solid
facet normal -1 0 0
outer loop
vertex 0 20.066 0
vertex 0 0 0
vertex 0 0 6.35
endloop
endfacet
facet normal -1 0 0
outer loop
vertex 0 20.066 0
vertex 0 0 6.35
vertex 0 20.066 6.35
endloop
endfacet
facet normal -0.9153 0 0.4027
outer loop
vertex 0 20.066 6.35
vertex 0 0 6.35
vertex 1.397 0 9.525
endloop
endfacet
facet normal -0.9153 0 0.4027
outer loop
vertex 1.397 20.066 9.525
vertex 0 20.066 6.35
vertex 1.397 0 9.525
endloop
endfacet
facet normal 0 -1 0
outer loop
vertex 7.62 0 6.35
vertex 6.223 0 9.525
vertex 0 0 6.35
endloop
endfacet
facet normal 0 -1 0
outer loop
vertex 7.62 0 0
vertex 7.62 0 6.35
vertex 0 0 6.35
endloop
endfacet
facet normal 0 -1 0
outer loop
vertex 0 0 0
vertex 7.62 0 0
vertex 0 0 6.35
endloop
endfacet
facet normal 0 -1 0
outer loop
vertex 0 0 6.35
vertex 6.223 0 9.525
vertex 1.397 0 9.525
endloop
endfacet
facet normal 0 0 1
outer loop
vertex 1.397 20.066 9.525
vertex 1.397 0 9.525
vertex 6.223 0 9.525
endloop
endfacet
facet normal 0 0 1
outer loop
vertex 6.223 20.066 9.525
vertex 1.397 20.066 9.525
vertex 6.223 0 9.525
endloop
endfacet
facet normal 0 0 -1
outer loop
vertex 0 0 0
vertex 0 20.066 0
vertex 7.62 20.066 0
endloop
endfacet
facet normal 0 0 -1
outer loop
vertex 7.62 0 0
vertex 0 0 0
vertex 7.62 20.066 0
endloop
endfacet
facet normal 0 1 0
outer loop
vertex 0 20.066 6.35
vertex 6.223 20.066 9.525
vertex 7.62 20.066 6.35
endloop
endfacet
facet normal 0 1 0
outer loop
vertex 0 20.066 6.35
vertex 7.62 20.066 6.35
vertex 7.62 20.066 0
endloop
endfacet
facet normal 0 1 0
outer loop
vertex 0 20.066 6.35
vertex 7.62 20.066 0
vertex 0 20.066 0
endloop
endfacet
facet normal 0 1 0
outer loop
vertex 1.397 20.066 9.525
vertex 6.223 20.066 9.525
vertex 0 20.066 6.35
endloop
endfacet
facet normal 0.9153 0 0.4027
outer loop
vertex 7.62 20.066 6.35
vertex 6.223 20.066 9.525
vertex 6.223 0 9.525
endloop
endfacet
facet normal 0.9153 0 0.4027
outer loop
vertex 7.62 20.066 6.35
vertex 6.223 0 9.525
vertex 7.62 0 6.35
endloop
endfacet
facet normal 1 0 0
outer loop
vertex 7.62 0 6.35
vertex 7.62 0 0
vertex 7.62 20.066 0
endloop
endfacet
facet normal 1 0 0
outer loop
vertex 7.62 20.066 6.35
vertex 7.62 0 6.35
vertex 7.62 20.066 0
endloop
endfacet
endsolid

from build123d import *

# Parameters (mm, degrees)
SKETCH1_W           = 7.62
SKETCH1_H           = 20.066
BOSS_EXTRUDE1_DEPTH = 6.35
BOSS_EXTRUDE2_DEPTH = 20.066


with BuildPart() as part:
    # Sketch1 → Boss-Extrude1 (new body)
    with BuildSketch(Plane.XY):
        with Locations((3.81, 10.033)):
            Rectangle(SKETCH1_W, SKETCH1_H)
    extrude(amount=BOSS_EXTRUDE1_DEPTH)

    # Sketch4 → Boss-Extrude2 (add)
    with BuildSketch(Plane.XZ):
        Polygon((0, 6.35), (1.397, 9.525), (6.223, 9.525), (7.62, 6.35), align=None)
    extrude(amount=-BOSS_EXTRUDE2_DEPTH)


solid = part.part
